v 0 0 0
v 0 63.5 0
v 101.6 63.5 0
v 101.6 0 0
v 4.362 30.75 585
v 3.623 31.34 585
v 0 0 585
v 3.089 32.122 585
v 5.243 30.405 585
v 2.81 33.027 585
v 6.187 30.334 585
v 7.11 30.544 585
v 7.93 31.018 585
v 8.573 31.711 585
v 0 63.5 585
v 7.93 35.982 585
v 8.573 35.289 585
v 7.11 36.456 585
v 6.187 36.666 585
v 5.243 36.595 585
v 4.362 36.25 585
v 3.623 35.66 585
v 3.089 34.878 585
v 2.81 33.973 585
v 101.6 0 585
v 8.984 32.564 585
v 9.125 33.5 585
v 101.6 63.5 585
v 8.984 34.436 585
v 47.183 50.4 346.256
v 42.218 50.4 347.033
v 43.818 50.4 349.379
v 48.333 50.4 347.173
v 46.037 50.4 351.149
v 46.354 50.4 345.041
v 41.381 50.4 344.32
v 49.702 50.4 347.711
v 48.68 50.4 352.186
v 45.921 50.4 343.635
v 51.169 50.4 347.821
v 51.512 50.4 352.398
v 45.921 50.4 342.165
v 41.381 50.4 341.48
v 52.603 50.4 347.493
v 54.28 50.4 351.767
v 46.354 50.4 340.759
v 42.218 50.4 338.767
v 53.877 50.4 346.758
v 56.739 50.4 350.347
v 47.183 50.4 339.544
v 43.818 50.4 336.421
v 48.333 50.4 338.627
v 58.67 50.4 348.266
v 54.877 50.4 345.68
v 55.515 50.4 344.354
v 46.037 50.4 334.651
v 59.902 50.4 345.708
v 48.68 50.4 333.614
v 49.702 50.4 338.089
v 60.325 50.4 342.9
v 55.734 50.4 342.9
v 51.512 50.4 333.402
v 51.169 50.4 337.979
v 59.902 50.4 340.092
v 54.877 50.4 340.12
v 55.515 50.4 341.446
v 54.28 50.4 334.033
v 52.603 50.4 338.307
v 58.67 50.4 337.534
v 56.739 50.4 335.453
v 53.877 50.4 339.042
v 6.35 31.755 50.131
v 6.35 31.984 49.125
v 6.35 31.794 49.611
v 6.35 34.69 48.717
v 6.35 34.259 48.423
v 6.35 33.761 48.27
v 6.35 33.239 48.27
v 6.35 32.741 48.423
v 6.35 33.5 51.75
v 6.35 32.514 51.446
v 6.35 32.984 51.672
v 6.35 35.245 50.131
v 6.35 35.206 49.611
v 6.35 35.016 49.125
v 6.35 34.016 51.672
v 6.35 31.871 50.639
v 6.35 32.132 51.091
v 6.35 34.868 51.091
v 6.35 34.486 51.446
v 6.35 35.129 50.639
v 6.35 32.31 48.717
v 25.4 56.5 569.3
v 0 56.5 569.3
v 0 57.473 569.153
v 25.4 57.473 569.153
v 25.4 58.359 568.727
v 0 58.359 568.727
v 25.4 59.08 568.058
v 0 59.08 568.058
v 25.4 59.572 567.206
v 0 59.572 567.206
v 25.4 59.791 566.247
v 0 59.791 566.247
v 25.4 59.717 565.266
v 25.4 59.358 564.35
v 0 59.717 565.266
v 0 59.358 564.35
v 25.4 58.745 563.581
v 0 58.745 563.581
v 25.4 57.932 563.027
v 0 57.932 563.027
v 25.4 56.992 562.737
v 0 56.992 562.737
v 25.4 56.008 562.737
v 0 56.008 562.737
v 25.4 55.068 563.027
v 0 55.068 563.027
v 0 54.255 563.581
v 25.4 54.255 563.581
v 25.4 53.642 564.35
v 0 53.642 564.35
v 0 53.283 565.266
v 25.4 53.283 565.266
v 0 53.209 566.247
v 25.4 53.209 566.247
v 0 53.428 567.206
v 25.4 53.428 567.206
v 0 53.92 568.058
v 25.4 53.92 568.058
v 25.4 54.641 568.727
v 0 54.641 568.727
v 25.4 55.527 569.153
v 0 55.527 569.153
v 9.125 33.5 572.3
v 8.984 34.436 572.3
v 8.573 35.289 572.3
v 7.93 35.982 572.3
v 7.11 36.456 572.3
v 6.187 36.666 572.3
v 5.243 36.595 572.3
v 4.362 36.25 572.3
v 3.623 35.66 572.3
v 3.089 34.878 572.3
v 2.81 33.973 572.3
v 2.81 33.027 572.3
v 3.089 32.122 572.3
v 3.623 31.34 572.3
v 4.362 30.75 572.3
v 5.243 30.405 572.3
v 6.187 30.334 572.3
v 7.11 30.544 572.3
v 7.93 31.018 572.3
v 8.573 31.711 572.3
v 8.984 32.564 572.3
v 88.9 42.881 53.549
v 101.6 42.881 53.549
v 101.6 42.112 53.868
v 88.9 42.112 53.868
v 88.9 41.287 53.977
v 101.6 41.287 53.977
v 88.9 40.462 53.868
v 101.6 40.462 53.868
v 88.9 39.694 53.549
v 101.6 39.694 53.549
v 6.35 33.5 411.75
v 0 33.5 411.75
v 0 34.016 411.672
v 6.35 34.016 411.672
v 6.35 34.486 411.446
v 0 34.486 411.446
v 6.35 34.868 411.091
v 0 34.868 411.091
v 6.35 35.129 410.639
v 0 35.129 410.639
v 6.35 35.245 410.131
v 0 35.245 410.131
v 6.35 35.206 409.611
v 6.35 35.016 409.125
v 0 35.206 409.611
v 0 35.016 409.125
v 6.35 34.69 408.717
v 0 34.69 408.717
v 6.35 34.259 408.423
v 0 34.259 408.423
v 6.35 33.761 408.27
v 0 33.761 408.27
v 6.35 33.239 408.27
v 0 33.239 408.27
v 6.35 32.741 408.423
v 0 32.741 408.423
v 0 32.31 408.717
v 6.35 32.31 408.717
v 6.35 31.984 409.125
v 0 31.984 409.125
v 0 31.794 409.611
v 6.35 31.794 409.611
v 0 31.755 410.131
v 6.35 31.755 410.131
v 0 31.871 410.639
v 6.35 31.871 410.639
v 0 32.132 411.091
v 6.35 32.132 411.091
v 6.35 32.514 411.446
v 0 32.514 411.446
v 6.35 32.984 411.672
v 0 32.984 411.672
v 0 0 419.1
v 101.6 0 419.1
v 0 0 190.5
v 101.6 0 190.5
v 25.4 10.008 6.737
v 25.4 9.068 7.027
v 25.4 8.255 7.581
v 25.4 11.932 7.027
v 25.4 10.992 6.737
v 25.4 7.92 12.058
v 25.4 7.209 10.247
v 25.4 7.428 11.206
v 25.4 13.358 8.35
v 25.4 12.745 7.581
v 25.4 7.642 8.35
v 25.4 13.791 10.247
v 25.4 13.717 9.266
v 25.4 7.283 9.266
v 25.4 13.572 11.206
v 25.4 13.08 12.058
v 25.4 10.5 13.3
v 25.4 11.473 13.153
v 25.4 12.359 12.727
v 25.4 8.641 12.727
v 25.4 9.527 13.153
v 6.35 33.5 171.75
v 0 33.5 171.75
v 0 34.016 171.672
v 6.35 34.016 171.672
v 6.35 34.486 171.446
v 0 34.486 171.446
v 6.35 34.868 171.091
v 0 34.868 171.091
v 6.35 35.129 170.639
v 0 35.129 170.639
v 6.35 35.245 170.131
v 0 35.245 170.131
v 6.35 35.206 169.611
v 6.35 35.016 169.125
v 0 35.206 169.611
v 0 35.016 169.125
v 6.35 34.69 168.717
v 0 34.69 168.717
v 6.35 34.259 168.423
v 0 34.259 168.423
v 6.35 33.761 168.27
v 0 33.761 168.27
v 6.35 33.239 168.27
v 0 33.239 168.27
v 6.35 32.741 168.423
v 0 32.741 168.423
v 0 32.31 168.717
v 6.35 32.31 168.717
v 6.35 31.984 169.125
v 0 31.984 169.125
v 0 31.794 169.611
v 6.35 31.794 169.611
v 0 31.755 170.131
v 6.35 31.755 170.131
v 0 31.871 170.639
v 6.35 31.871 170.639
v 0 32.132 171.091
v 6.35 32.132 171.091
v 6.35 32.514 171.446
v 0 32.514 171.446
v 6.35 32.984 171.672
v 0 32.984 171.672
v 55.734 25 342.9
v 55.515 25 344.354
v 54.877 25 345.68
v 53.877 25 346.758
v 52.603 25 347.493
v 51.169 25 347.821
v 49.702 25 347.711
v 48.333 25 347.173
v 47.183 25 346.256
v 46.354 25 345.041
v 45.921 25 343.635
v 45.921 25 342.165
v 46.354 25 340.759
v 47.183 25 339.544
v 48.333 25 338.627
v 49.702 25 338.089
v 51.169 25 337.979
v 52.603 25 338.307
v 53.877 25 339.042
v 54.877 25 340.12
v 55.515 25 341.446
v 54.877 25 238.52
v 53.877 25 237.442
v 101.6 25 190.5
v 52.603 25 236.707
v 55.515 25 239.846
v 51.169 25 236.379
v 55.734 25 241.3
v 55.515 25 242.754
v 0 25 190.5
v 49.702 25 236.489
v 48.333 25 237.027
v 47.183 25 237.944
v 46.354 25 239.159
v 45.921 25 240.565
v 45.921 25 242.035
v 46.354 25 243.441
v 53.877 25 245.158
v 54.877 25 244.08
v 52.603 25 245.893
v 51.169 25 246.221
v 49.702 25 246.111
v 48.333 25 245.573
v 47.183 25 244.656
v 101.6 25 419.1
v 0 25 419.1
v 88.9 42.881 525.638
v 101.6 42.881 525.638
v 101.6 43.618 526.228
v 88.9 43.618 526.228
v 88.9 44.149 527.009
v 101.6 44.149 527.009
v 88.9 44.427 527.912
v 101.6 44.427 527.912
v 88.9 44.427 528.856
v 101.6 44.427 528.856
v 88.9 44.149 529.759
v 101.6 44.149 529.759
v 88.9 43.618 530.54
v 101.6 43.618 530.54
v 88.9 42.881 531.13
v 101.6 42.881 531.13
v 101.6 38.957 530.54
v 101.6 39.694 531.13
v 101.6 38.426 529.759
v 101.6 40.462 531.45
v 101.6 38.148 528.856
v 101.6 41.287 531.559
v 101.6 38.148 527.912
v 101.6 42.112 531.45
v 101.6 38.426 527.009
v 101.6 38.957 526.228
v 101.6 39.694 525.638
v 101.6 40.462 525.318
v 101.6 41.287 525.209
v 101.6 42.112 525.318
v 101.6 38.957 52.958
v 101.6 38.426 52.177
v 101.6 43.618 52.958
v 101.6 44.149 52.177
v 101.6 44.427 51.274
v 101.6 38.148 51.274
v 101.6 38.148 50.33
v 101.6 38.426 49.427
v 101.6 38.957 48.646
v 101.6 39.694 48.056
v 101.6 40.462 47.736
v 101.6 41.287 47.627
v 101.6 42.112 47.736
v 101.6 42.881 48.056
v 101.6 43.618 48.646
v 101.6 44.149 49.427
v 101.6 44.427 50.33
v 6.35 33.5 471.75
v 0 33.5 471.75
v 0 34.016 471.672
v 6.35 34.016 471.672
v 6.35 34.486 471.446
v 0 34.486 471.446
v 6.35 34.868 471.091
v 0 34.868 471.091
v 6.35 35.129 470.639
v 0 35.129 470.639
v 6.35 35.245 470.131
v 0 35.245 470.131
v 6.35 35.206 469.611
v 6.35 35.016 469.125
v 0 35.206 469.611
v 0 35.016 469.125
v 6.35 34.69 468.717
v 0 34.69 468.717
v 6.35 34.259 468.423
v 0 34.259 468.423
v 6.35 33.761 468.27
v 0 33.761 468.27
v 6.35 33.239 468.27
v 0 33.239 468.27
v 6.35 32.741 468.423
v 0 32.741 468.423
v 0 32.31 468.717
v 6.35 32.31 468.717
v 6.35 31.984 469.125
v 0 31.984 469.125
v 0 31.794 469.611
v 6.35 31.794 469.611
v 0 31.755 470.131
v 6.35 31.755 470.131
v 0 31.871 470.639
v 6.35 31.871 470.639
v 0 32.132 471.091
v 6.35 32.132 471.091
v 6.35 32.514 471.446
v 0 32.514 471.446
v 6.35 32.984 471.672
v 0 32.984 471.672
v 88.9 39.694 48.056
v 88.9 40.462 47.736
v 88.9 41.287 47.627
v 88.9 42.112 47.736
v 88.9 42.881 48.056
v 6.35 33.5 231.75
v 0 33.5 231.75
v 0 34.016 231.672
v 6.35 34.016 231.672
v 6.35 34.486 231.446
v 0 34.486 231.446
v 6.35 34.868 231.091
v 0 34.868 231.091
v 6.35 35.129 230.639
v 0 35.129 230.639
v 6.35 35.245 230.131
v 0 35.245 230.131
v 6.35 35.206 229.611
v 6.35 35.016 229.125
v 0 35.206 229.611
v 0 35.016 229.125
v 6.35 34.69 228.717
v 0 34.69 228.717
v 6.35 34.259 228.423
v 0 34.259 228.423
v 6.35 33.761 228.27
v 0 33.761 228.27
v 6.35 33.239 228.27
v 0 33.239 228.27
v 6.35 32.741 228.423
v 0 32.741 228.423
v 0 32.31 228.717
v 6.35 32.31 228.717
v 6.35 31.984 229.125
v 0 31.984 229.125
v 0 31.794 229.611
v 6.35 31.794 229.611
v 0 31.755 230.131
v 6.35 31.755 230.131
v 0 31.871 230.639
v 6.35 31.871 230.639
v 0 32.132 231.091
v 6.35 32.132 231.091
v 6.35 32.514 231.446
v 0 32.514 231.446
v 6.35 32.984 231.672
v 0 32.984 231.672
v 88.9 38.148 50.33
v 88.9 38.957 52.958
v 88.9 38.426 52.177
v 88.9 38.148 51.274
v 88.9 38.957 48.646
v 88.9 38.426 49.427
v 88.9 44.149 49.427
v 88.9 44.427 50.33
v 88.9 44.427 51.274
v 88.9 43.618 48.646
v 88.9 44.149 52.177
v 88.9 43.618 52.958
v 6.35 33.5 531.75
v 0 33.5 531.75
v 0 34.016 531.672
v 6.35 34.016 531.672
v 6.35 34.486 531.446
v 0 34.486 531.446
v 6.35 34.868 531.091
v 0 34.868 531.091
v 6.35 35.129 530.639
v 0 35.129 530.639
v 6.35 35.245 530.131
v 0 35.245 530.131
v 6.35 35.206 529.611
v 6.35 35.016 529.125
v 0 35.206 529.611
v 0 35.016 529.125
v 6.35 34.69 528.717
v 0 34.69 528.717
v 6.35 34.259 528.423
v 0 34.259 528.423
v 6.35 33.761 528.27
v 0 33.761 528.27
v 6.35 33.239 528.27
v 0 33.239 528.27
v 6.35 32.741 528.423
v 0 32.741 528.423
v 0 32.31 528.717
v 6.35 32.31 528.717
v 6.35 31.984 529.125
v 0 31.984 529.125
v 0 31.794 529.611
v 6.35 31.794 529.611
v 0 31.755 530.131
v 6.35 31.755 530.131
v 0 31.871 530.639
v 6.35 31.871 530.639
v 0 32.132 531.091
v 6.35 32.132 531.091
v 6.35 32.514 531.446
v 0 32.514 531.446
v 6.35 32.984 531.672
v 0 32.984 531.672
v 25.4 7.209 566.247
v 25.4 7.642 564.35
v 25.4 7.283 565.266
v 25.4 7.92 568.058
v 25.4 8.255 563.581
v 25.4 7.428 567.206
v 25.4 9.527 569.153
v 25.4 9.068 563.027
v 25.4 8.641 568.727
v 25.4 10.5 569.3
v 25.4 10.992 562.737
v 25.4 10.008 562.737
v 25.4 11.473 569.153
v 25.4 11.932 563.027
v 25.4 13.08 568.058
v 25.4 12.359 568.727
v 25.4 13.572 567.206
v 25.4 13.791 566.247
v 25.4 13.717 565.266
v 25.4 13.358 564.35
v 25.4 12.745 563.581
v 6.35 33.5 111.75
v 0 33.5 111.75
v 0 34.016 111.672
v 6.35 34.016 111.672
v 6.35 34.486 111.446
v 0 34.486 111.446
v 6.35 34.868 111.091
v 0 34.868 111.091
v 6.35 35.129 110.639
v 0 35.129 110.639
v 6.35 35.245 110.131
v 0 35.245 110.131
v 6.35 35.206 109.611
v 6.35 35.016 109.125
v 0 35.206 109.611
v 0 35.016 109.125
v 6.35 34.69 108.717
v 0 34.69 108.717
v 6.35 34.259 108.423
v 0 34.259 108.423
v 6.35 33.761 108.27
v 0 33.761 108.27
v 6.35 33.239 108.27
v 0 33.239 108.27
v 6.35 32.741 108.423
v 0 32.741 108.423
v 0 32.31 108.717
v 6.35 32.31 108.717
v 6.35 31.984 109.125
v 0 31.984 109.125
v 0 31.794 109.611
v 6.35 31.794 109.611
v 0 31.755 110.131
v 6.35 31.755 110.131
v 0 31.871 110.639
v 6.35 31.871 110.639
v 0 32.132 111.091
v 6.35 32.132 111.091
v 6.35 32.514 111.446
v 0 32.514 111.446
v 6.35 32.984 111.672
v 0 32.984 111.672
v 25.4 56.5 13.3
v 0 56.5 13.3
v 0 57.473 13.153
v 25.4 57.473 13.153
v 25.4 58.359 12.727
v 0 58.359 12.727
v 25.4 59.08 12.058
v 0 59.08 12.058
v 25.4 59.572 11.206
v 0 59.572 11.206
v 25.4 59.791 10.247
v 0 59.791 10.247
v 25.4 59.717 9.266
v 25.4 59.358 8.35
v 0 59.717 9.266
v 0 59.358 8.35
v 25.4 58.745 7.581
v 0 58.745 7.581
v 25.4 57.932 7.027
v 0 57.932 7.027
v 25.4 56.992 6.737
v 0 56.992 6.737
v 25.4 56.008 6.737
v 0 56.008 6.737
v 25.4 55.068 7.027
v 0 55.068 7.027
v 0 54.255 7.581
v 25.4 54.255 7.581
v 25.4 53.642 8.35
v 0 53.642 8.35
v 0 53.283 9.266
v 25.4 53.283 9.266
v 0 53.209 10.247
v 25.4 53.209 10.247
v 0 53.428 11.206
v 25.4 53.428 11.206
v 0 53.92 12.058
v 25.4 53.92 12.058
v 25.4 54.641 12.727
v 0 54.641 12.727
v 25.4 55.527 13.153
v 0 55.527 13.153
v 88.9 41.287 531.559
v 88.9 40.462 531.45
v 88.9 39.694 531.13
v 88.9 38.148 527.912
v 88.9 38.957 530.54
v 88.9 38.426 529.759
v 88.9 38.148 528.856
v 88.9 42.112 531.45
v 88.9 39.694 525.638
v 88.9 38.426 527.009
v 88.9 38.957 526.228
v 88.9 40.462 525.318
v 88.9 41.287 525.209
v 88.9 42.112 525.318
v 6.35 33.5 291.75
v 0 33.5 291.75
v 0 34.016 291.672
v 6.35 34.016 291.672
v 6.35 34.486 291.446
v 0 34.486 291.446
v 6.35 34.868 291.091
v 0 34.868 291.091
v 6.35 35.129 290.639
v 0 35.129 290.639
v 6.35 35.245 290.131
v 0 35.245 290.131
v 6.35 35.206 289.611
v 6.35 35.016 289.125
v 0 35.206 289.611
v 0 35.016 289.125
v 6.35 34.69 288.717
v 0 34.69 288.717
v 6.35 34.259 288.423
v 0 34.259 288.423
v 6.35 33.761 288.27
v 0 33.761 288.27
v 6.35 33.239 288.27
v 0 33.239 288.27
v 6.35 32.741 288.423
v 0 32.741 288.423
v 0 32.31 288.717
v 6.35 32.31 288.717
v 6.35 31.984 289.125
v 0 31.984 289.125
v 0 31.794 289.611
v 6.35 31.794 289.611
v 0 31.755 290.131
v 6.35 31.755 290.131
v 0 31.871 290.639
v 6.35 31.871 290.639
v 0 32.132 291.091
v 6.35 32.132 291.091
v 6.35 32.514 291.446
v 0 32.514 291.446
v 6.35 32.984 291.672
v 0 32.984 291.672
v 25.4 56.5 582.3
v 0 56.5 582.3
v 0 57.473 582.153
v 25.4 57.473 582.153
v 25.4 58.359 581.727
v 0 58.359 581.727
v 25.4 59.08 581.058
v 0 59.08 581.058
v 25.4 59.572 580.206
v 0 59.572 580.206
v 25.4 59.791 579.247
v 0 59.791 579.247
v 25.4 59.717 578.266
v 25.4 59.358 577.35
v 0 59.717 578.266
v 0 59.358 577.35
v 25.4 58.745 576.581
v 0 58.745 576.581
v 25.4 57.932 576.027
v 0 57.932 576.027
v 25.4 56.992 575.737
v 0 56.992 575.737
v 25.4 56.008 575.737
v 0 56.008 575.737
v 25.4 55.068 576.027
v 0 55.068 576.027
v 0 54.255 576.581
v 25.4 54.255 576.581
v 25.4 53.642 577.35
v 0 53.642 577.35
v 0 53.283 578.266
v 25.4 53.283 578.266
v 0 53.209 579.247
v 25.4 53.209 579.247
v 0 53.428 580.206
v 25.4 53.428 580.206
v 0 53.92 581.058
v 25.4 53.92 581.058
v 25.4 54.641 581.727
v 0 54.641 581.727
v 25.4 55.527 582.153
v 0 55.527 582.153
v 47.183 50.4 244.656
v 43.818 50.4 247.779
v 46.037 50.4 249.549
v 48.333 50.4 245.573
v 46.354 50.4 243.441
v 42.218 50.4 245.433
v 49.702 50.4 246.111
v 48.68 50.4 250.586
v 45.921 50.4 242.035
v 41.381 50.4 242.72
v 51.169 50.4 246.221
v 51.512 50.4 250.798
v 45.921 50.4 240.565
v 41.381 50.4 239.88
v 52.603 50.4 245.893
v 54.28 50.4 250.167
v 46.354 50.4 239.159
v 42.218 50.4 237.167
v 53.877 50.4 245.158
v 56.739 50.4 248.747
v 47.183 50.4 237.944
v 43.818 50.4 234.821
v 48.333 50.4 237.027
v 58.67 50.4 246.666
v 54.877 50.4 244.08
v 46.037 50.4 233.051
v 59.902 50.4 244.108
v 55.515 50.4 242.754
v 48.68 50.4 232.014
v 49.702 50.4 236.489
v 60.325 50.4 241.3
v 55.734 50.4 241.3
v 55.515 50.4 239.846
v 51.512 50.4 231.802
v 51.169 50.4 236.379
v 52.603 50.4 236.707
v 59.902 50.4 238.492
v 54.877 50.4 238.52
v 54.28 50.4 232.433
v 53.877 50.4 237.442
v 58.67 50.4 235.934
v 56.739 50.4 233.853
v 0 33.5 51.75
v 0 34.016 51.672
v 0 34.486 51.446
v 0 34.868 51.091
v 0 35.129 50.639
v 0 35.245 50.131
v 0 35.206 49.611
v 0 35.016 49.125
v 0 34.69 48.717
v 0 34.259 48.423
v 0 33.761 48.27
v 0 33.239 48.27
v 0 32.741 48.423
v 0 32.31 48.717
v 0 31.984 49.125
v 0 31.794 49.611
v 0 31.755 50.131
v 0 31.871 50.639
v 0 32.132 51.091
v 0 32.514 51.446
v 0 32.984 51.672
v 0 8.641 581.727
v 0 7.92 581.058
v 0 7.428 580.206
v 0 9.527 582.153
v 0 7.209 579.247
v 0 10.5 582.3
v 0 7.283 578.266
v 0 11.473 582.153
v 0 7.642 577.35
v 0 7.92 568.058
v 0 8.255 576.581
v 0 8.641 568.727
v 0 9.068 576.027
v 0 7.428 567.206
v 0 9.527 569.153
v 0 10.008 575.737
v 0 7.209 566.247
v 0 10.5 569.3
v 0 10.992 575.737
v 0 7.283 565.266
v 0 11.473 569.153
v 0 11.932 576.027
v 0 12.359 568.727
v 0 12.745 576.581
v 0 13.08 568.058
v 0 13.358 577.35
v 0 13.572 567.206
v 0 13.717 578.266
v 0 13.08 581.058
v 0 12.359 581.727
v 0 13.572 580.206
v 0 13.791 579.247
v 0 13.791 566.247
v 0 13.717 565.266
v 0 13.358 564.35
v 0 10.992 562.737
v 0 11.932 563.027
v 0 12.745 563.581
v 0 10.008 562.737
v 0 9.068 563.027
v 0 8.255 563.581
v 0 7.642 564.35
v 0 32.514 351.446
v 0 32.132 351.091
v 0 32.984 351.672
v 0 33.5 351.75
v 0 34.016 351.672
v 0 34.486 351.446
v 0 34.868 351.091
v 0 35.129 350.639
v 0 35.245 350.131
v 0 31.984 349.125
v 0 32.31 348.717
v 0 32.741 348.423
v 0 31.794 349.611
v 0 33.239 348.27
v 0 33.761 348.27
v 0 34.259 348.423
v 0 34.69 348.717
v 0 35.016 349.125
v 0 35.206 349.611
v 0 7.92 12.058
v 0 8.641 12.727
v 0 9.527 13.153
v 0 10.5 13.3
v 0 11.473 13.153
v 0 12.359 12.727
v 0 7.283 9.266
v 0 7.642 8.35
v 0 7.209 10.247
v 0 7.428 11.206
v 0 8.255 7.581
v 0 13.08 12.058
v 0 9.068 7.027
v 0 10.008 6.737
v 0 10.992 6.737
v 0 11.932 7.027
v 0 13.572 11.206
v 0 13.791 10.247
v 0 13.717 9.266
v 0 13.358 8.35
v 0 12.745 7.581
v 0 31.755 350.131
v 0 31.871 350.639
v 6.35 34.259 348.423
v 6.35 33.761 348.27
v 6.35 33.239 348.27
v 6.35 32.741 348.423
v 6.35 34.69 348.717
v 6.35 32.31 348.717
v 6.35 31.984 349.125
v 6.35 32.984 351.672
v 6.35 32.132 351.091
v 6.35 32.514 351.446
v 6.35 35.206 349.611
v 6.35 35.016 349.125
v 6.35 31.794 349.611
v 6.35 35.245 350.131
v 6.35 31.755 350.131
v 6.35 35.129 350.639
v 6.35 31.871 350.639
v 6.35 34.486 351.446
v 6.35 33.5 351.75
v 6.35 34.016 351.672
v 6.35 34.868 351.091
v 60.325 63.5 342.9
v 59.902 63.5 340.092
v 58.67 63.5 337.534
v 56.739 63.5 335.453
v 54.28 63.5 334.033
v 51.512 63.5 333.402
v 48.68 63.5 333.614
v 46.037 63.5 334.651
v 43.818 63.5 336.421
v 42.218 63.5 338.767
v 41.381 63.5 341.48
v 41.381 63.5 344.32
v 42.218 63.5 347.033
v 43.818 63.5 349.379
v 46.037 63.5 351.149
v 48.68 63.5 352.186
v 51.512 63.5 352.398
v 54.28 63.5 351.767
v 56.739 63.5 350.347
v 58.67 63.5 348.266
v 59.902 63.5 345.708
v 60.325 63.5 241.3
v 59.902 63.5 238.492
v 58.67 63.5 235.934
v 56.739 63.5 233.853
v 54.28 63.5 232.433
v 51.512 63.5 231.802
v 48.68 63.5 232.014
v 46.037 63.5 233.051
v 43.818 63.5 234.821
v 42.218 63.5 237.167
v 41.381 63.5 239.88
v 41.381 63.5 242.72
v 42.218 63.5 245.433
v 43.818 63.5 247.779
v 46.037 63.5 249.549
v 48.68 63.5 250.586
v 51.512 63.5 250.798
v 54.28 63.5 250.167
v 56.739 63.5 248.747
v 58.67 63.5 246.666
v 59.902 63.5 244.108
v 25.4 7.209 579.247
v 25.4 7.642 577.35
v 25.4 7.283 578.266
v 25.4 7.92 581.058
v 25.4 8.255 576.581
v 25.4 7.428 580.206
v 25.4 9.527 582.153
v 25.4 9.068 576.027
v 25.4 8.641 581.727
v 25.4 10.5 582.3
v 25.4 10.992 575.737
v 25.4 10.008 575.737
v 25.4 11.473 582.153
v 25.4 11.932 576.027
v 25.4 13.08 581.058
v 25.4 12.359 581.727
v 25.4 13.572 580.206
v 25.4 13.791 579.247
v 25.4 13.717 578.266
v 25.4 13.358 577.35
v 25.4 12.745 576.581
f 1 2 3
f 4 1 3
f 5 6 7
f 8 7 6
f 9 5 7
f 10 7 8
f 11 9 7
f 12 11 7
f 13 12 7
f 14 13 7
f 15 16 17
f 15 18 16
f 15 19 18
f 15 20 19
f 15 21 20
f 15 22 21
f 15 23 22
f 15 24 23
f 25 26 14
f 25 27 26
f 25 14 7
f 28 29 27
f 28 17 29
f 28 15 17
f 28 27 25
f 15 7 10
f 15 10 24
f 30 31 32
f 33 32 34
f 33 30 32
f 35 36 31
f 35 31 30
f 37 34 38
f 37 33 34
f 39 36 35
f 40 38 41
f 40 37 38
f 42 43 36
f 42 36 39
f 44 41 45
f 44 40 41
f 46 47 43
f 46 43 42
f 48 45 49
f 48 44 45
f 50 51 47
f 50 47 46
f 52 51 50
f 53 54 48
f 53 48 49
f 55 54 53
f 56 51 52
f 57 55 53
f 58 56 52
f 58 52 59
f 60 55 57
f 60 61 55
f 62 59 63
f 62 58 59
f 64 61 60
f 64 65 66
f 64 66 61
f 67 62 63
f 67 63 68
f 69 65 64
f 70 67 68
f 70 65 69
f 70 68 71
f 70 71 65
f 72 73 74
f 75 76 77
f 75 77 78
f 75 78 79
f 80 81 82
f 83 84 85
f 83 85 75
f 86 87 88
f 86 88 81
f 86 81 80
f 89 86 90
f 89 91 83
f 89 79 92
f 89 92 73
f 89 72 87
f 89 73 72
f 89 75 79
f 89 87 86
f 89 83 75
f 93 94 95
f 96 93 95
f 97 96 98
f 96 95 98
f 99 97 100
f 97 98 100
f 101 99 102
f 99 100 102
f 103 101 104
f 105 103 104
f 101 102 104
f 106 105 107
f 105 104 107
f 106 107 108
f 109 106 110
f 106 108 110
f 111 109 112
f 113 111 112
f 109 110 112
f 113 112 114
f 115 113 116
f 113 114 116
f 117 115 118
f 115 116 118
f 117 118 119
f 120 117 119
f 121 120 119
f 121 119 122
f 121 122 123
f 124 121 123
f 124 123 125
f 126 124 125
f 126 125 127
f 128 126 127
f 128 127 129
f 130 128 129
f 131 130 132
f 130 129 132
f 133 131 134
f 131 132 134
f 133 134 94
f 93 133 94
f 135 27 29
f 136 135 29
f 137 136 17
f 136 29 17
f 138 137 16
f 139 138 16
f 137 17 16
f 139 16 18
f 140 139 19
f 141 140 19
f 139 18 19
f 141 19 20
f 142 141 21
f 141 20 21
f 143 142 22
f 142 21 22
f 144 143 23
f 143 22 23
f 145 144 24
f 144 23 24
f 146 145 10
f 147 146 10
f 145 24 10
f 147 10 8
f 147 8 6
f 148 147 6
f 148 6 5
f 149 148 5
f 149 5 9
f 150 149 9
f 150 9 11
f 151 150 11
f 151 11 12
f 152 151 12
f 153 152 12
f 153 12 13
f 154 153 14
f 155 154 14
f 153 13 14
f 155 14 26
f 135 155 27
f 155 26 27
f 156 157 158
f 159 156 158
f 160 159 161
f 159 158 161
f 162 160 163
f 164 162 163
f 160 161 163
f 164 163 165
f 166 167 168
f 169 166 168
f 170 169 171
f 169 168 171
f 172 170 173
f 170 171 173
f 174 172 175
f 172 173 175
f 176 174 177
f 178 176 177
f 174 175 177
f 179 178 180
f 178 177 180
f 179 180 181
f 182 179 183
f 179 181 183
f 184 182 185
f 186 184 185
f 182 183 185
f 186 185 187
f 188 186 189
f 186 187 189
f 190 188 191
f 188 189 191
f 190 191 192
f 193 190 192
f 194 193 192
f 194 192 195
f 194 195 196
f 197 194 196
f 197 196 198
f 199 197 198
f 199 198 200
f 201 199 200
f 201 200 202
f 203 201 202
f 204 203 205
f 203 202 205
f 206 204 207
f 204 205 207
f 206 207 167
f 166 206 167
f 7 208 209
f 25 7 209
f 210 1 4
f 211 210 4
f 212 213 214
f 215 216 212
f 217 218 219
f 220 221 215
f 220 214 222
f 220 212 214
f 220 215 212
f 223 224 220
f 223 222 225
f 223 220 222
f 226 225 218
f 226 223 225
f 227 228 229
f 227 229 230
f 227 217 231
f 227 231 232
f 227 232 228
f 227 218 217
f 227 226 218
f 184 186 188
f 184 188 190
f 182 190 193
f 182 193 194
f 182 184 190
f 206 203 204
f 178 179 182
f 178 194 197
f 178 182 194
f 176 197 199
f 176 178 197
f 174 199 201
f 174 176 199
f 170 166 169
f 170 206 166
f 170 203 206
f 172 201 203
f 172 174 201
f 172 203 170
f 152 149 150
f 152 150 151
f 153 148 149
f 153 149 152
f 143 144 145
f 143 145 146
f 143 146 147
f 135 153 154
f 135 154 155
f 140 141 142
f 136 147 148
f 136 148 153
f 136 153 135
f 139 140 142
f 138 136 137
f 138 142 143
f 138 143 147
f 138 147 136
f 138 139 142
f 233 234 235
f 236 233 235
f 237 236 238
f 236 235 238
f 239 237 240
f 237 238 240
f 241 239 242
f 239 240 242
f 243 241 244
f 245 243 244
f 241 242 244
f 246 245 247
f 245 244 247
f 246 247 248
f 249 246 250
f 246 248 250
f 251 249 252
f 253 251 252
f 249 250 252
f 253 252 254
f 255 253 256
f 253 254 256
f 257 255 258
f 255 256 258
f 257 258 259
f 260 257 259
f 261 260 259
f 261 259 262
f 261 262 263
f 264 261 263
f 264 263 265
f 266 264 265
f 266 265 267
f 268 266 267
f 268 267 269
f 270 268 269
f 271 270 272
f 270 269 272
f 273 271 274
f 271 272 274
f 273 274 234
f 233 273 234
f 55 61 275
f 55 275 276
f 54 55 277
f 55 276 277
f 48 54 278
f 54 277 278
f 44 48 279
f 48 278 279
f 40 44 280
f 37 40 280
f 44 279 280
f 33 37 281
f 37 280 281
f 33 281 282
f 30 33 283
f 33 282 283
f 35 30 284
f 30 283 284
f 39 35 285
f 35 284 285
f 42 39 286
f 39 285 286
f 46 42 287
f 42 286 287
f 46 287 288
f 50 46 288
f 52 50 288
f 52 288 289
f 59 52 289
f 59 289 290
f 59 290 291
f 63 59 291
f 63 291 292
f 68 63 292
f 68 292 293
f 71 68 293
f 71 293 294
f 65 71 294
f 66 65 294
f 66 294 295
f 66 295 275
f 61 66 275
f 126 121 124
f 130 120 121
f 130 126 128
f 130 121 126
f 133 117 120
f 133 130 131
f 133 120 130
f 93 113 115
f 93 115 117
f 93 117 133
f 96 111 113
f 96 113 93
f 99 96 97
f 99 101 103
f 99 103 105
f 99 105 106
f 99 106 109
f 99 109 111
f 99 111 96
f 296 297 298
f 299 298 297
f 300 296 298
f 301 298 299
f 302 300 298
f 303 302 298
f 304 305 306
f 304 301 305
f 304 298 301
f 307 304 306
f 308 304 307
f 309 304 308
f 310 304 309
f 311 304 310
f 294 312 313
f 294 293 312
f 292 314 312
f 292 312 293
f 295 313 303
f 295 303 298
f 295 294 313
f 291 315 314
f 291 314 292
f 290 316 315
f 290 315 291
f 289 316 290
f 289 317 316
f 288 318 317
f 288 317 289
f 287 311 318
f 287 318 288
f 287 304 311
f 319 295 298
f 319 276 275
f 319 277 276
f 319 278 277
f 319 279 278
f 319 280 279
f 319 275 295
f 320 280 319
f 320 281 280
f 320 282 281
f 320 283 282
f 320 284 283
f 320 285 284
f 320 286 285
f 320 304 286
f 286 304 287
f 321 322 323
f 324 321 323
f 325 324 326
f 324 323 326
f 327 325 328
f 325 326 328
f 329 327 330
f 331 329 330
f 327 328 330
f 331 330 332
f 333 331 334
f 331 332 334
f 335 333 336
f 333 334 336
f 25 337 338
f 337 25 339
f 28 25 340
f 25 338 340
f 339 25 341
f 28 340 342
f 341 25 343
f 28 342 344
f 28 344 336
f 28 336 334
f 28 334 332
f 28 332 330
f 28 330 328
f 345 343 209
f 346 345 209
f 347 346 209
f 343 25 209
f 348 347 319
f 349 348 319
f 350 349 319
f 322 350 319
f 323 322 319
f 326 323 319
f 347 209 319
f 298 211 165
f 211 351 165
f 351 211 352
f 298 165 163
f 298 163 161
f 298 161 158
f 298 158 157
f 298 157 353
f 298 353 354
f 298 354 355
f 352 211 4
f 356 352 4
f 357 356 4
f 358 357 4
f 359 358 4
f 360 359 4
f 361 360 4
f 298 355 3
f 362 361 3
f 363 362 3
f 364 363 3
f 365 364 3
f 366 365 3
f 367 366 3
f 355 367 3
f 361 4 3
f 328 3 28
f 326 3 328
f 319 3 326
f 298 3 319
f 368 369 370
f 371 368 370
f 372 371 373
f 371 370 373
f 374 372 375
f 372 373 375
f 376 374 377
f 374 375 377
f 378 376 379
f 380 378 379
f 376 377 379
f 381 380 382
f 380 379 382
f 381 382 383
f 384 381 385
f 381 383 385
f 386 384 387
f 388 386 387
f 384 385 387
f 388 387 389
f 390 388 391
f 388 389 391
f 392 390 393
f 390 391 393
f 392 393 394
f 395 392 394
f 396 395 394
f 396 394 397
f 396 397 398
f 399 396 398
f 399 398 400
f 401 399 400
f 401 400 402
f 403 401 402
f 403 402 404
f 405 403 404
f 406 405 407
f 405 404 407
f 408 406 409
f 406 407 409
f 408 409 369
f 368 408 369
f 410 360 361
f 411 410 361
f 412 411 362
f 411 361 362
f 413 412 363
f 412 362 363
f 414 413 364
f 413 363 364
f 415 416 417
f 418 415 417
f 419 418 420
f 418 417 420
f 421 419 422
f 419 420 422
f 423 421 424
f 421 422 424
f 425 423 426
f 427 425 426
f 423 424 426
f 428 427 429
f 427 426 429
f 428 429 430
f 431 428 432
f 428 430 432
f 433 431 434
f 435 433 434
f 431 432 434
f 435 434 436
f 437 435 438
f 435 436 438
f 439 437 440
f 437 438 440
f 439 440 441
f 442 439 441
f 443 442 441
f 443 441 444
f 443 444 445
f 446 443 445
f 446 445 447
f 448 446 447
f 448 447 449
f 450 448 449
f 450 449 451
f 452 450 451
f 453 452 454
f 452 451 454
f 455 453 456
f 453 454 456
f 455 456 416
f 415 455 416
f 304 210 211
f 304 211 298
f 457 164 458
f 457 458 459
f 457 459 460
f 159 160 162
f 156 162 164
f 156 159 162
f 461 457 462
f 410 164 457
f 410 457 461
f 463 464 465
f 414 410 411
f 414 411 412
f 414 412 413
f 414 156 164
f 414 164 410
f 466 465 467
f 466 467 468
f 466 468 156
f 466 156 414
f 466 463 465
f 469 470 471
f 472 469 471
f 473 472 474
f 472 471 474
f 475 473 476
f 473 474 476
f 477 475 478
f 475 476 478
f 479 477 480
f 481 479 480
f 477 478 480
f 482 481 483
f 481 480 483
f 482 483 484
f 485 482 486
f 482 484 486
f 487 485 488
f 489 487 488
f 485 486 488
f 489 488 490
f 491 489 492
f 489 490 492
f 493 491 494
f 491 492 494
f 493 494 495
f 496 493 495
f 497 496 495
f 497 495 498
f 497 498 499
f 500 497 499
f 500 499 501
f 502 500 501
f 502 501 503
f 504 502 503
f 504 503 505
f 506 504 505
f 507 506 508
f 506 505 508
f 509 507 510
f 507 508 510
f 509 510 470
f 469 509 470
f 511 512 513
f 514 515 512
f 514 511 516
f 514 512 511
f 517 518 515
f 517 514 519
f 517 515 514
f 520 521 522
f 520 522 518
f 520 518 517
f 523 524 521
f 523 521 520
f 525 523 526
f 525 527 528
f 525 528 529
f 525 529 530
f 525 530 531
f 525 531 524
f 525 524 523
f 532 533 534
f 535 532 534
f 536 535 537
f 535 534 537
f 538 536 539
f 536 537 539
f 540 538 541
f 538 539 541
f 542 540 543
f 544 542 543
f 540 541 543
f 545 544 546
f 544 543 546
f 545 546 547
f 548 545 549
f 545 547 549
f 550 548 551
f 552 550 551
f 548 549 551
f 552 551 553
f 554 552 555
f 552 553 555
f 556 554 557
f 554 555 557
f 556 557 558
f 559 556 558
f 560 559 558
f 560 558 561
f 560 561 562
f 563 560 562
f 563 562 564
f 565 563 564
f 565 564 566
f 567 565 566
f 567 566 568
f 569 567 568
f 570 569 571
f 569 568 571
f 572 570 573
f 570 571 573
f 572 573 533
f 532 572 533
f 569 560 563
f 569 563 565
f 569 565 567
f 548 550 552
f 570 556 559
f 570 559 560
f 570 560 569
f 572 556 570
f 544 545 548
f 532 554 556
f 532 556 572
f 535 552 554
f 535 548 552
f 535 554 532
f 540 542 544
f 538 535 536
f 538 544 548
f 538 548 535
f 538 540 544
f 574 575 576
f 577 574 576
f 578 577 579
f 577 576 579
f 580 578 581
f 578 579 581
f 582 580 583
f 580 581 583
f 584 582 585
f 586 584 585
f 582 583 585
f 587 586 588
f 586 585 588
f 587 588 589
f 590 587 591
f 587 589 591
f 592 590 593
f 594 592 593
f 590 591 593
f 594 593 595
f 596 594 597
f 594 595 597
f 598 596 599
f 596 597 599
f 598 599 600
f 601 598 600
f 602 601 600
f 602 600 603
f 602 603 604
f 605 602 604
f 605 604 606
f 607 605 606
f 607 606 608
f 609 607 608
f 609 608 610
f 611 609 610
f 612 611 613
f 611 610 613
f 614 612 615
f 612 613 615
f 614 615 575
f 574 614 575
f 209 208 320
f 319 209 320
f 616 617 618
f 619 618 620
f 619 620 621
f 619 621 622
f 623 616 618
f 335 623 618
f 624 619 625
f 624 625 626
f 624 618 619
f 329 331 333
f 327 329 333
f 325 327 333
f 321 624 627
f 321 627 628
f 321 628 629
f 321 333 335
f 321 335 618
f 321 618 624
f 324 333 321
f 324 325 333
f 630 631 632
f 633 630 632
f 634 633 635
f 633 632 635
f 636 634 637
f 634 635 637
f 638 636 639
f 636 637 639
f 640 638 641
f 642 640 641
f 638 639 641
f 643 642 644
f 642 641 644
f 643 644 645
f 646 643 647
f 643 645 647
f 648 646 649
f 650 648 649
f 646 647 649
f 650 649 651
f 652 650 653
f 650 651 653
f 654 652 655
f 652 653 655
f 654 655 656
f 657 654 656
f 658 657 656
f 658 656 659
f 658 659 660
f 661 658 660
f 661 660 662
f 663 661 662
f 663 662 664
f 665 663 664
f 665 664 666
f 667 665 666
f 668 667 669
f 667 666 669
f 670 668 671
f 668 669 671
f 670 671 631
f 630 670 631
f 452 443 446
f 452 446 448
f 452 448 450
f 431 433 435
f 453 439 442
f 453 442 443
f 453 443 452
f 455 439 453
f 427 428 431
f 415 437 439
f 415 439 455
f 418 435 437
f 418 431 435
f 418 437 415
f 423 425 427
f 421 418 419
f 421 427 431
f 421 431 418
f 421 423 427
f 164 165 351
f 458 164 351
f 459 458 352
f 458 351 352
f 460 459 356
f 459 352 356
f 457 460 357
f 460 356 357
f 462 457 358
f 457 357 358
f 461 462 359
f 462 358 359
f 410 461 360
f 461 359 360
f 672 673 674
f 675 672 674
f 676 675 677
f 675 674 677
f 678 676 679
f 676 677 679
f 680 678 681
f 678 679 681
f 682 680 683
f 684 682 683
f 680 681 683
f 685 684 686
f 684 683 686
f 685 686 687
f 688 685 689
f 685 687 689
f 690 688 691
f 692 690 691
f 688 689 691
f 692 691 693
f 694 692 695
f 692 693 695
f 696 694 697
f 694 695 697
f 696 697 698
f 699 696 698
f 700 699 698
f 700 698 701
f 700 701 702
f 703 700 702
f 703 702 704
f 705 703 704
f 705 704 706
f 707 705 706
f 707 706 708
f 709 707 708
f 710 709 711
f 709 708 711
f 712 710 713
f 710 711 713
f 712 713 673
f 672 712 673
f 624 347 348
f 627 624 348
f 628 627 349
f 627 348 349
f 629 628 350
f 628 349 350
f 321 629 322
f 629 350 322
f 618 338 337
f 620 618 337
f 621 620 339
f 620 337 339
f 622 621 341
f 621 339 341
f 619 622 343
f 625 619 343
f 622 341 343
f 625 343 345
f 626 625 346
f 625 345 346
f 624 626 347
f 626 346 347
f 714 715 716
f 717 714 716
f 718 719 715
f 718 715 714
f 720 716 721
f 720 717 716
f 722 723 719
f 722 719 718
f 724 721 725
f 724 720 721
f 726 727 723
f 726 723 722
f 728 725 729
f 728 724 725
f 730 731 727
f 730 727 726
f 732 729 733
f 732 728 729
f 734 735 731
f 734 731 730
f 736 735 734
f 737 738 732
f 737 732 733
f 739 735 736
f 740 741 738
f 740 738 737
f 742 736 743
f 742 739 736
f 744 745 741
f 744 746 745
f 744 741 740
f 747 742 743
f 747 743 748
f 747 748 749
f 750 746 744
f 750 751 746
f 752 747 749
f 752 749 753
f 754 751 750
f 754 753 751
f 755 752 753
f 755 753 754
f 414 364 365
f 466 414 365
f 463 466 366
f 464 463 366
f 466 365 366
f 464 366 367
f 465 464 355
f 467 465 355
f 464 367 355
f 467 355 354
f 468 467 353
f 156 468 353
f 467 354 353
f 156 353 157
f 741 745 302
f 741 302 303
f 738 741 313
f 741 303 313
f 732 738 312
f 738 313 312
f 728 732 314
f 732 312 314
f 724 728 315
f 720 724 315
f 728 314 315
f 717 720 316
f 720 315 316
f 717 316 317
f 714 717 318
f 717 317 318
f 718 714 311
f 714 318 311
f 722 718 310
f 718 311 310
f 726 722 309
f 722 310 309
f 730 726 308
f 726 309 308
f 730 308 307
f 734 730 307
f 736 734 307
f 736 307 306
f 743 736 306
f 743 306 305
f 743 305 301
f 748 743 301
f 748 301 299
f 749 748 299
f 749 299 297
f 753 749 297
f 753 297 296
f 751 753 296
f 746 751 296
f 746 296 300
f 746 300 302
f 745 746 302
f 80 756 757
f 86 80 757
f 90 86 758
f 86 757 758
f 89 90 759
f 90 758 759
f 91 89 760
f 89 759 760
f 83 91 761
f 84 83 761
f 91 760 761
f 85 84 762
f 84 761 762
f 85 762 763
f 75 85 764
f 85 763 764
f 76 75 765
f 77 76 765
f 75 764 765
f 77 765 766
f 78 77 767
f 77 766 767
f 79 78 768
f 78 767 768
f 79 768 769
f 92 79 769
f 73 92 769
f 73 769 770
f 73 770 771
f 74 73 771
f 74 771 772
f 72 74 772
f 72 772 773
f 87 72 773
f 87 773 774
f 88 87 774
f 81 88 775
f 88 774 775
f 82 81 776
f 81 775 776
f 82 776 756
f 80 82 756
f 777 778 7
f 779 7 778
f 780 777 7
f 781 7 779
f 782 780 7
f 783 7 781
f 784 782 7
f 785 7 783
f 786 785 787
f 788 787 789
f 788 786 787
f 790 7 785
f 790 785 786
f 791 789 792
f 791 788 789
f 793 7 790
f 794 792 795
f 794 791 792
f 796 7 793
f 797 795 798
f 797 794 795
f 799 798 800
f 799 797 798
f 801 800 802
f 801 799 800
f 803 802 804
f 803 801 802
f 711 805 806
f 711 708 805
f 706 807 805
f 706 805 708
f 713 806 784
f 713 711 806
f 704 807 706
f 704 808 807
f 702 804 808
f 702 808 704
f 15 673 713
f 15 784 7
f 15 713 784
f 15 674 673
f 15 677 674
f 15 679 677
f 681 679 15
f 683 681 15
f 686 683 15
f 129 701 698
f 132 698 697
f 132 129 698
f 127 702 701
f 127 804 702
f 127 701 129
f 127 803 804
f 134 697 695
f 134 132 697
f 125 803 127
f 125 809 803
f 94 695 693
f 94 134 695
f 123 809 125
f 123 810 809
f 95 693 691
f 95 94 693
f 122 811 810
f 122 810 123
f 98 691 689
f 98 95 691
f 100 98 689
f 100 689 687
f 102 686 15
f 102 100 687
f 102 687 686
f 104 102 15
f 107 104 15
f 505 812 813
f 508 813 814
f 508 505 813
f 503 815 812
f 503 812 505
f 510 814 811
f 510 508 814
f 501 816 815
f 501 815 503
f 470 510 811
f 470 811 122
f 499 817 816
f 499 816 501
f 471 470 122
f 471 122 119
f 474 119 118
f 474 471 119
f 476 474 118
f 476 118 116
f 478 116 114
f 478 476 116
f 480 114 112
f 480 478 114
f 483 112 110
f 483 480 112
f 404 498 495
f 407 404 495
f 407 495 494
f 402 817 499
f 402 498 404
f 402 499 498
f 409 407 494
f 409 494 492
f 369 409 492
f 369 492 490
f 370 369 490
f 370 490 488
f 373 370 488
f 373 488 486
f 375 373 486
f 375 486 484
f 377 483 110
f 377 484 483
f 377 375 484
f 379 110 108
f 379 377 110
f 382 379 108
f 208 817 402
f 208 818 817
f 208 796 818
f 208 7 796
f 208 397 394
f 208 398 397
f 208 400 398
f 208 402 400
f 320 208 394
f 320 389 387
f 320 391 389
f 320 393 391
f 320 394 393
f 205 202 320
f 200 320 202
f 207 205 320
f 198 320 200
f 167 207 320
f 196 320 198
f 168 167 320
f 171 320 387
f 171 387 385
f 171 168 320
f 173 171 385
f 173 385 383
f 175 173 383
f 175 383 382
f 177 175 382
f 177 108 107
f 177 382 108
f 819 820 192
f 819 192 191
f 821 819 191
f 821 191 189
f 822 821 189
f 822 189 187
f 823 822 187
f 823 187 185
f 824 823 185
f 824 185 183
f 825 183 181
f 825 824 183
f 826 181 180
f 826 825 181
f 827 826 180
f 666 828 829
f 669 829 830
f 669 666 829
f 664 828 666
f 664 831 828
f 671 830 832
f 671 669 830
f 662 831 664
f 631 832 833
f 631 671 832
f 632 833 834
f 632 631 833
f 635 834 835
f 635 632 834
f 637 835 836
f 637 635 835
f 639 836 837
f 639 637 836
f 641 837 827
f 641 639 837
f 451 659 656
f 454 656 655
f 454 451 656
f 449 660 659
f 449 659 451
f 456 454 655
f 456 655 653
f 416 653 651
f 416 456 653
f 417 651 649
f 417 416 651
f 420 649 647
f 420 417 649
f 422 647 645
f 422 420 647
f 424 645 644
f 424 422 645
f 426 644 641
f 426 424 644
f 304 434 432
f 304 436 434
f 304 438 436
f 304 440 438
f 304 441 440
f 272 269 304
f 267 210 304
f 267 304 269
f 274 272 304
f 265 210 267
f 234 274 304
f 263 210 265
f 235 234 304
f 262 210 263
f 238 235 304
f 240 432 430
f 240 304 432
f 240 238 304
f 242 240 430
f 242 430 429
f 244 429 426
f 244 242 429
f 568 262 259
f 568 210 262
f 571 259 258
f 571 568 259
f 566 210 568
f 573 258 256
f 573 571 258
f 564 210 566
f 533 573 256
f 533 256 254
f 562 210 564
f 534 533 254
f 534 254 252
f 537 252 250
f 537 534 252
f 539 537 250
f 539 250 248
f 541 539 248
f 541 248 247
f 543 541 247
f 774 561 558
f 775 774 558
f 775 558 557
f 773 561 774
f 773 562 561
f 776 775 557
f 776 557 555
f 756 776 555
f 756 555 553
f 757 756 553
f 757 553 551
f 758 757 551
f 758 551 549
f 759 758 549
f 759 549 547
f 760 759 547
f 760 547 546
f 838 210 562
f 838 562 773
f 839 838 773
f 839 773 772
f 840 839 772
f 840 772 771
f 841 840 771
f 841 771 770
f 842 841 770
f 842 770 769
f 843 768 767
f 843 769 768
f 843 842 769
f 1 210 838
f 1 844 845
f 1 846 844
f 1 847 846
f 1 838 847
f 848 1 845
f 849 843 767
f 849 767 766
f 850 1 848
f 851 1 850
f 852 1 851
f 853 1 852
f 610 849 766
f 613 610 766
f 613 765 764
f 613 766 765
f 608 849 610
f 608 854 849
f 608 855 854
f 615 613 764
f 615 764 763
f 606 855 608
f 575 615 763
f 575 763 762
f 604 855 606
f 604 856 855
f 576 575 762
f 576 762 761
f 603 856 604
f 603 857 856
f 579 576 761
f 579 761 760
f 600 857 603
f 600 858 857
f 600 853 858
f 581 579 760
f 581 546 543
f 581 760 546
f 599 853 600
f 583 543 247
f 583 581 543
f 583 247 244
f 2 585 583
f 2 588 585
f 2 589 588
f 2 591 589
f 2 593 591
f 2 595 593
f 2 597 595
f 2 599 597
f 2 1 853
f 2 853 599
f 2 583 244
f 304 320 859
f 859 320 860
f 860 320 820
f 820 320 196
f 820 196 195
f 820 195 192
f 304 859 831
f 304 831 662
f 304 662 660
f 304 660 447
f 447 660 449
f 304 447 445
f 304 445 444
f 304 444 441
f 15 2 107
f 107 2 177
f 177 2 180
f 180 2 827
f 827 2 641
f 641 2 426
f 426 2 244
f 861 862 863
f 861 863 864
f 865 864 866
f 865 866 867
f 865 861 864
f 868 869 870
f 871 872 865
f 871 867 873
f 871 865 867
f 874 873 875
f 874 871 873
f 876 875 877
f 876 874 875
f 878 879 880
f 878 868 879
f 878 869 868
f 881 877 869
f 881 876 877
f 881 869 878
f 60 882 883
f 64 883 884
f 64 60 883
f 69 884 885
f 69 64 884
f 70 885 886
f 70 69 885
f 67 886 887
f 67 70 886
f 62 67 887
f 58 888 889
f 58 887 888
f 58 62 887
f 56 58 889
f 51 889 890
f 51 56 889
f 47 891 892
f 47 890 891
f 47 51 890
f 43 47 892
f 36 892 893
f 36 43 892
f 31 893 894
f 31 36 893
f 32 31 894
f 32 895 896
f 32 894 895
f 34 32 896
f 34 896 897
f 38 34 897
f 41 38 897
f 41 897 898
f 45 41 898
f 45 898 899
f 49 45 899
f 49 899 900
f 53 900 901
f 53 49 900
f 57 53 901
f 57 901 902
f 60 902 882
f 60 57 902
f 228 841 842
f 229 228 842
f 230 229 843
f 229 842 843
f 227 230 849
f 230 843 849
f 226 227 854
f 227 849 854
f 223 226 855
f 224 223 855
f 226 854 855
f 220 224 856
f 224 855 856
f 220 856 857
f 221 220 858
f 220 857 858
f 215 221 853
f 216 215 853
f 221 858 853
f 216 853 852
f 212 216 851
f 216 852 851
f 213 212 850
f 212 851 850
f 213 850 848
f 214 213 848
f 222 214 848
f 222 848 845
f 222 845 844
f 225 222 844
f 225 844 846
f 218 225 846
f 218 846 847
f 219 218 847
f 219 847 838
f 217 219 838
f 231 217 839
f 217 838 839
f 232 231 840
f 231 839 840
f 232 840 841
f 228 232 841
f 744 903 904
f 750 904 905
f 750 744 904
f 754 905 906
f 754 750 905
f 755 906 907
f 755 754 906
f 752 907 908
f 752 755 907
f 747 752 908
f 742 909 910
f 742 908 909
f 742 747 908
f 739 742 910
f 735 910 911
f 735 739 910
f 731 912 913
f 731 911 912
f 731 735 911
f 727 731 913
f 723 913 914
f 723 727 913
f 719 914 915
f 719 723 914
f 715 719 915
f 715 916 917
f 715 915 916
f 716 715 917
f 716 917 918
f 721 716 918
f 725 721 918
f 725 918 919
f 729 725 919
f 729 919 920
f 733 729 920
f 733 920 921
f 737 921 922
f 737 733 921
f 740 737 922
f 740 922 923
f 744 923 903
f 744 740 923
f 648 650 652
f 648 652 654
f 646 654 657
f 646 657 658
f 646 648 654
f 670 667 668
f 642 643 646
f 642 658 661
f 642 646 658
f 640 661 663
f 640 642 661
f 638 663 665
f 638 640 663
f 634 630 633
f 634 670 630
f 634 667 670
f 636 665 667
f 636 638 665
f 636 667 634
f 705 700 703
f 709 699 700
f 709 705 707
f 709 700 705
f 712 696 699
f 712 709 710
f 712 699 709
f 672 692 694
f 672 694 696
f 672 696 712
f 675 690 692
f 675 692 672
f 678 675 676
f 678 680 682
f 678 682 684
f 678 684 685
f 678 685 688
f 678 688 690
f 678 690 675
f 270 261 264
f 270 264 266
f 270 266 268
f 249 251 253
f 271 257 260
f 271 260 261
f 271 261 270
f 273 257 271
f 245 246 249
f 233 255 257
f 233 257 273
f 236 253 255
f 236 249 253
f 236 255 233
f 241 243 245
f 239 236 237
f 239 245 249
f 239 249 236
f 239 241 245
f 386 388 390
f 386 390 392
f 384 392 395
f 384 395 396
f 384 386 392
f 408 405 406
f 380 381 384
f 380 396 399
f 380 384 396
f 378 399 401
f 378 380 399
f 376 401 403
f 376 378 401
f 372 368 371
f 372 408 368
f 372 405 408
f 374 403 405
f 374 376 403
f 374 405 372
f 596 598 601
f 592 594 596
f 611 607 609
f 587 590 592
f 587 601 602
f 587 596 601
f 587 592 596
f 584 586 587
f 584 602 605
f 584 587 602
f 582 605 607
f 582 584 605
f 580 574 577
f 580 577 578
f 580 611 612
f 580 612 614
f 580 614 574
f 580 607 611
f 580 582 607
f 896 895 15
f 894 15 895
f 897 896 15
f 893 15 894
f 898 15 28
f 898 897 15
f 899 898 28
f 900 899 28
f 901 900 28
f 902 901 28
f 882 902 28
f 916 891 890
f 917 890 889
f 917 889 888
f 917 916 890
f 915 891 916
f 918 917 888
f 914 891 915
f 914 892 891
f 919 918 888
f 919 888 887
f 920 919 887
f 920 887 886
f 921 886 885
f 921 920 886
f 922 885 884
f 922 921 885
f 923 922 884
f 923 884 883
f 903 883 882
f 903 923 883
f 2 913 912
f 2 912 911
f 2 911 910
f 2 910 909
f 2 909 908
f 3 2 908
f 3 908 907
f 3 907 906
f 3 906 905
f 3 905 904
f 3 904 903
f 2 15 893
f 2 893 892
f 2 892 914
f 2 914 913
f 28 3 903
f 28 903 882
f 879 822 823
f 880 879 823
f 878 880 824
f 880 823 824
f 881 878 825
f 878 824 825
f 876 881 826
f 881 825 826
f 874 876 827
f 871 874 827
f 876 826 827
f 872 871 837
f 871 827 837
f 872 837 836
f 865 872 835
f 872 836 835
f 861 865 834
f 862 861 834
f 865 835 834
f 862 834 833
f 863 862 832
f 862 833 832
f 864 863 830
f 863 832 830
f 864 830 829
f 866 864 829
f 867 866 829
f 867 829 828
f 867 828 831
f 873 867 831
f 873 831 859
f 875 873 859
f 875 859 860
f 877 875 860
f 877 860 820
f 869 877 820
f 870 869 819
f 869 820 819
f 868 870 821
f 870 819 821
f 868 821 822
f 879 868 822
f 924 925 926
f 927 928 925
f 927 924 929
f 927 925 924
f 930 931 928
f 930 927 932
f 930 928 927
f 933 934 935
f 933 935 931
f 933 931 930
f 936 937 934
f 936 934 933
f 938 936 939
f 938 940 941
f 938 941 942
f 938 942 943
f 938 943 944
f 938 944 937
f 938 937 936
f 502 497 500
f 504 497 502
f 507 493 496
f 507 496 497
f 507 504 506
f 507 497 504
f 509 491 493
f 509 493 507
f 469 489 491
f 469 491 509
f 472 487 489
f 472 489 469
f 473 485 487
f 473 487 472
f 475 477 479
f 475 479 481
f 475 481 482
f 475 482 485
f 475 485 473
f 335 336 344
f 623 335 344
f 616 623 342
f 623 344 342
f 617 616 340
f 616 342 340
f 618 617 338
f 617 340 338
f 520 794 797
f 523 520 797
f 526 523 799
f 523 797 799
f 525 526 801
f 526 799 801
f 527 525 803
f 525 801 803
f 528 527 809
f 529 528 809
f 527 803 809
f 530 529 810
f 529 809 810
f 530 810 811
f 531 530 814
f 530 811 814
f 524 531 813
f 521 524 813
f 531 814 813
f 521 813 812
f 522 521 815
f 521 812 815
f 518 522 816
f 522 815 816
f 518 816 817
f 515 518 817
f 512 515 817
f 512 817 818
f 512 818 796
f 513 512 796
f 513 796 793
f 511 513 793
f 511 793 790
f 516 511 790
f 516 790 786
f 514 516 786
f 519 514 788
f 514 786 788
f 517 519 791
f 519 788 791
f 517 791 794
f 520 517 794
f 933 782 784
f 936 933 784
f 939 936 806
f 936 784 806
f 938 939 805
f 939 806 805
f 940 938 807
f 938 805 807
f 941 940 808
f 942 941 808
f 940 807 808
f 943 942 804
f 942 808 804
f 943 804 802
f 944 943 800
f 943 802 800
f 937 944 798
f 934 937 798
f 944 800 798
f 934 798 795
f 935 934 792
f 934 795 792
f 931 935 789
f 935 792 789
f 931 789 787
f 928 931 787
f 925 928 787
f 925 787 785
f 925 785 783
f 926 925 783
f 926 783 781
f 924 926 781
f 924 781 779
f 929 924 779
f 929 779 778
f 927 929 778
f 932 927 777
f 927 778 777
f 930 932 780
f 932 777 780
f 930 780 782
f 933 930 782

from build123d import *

# Parameters (mm, degrees)
SKETCH1_W           = 101.6
SKETCH1_H           = 63.5
BOSS_EXTRUDE1_DEPTH = 585.0001
SKETCH2_W           = 228.6
SKETCH2_H           = 25
CUT_EXTRUDE1_DEPTH  = 102.6
SKETCH5_R           = 1.75
CUT_EXTRUDE4_DEPTH  = 6.35
SKETCH5_3_R         = 3.3
CUT_EXTRUDE5_DEPTH  = 25.4
SKETCH6_R           = 4.934351916
CUT_EXTRUDE6_DEPTH  = 39.5
CUT_EXTRUDE7_DEPTH  = 12.7
SKETCH8_R           = 3.175
CUT_EXTRUDE8_DEPTH  = 12.7
CUT_EXTRUDE9_START  = 50.8
SKETCH9_R           = 9.525
CUT_EXTRUDE9_DEPTH  = 14.1


with BuildPart() as part:
    # Sketch1 → Boss-Extrude1 (new body)
    with BuildSketch(Plane.XY):
        with Locations((50.8, 31.75)):
            Rectangle(SKETCH1_W, SKETCH1_H)
    extrude(amount=BOSS_EXTRUDE1_DEPTH)

    # Sketch2 → Cut-Extrude1 (cut, through all)
    with BuildSketch(Plane.ZY):
        with Locations((304.8, 12.5)):
            Rectangle(SKETCH2_W, SKETCH2_H)
    extrude(amount=-CUT_EXTRUDE1_DEPTH, mode=Mode.SUBTRACT)

    # Sketch5 → Cut-Extrude4 (cut)
    with BuildSketch(Plane.ZY):
        with Locations((530, 33.5)):
            Circle(SKETCH5_R)
        with Locations((470, 33.5)):
            Circle(SKETCH5_R)
        with Locations((410, 33.5)):
            Circle(SKETCH5_R)
        with Locations((350, 33.5)):
            Circle(SKETCH5_R)
        with Locations((290, 33.5)):
            Circle(SKETCH5_R)
        with Locations((230, 33.5)):
            Circle(SKETCH5_R)
        with Locations((170, 33.5)):
            Circle(SKETCH5_R)
        with Locations((110, 33.5)):
            Circle(SKETCH5_R)
        with Locations((50, 33.5)):
            Circle(SKETCH5_R)
    extrude(amount=-CUT_EXTRUDE4_DEPTH, mode=Mode.SUBTRACT)

    # Sketch5_3 → Cut-Extrude5 (cut)
    with BuildSketch(Plane.ZY):
        with Locations((579, 10.5)):
            Circle(SKETCH5_3_R)
        with Locations((566, 10.5)):
            Circle(SKETCH5_3_R)
        with Locations((579, 56.5)):
            Circle(SKETCH5_3_R)
        with Locations((566, 56.5)):
            Circle(SKETCH5_3_R)
        with Locations((10, 10.5)):
            Circle(SKETCH5_3_R)
        with Locations((10, 56.5)):
            Circle(SKETCH5_3_R)
    extrude(amount=-CUT_EXTRUDE5_DEPTH, mode=Mode.SUBTRACT)

    # Sketch6 → Cut-Extrude6 (cut, through all)
    with BuildSketch(Plane.XZ.offset(-25)):
        with Locations((50.8, 342.9)):
            Circle(SKETCH6_R)
        with Locations((50.8, 241.3)):
            Circle(SKETCH6_R)
    extrude(amount=-CUT_EXTRUDE6_DEPTH, mode=Mode.SUBTRACT)

    # Sketch7 → Cut-Extrude7 (cut)
    with BuildSketch(Plane(origin=(101.6, 0, 0), x_dir=(0, 0, -1), z_dir=(1, 0, 0))):
        with BuildLine():
            ThreePointArc((-53.548542941, 39.694194493), (-50.80220266, 38.11238), (-48.055862379, 39.694194493))
            ThreePointArc((-48.055862379, 39.694194493), (-47.62720266, 41.28738), (-48.055862379, 42.880565507))
            ThreePointArc((-48.055862379, 42.880565507), (-50.80220266, 44.46238), (-53.548542941, 42.880565507))
            ThreePointArc((-53.548542941, 42.880565507), (-53.97720266, 41.28738), (-53.548542941, 39.694194493))
        make_face()
        with BuildLine():
            ThreePointArc((-525.637642589, 39.694194493), (-525.20898287, 41.28738), (-525.637642589, 42.880565507))
            ThreePointArc((-525.637642589, 42.880565507), (-528.38398287, 44.46238), (-531.130323151, 42.880565507))
            ThreePointArc((-531.130323151, 42.880565507), (-531.55898287, 41.28738), (-531.130323151, 39.694194493))
            ThreePointArc((-531.130323151, 39.694194493), (-528.38398287, 38.11238), (-525.637642589, 39.694194493))
        make_face()
    extrude(amount=-CUT_EXTRUDE7_DEPTH, mode=Mode.SUBTRACT)

    # Sketch8 → Cut-Extrude8 (cut)
    with BuildSketch(Plane.XY.offset(585.0001)):
        with Locations((5.95, 33.5)):
            Circle(SKETCH8_R)
    extrude(amount=-CUT_EXTRUDE8_DEPTH, mode=Mode.SUBTRACT)

    # Sketch9 → Cut-Extrude9 (cut, through all)
    with BuildSketch(Plane(origin=(0, -0.4, 0), x_dir=(1, 0, 0), z_dir=(0, 1, 0)).offset(CUT_EXTRUDE9_START)):
        with Locations((50.8, -342.9)):
            Circle(SKETCH9_R)
        with Locations((50.8, -241.3)):
            Circle(SKETCH9_R)
    extrude(amount=CUT_EXTRUDE9_DEPTH, mode=Mode.SUBTRACT)


solid = part.part
